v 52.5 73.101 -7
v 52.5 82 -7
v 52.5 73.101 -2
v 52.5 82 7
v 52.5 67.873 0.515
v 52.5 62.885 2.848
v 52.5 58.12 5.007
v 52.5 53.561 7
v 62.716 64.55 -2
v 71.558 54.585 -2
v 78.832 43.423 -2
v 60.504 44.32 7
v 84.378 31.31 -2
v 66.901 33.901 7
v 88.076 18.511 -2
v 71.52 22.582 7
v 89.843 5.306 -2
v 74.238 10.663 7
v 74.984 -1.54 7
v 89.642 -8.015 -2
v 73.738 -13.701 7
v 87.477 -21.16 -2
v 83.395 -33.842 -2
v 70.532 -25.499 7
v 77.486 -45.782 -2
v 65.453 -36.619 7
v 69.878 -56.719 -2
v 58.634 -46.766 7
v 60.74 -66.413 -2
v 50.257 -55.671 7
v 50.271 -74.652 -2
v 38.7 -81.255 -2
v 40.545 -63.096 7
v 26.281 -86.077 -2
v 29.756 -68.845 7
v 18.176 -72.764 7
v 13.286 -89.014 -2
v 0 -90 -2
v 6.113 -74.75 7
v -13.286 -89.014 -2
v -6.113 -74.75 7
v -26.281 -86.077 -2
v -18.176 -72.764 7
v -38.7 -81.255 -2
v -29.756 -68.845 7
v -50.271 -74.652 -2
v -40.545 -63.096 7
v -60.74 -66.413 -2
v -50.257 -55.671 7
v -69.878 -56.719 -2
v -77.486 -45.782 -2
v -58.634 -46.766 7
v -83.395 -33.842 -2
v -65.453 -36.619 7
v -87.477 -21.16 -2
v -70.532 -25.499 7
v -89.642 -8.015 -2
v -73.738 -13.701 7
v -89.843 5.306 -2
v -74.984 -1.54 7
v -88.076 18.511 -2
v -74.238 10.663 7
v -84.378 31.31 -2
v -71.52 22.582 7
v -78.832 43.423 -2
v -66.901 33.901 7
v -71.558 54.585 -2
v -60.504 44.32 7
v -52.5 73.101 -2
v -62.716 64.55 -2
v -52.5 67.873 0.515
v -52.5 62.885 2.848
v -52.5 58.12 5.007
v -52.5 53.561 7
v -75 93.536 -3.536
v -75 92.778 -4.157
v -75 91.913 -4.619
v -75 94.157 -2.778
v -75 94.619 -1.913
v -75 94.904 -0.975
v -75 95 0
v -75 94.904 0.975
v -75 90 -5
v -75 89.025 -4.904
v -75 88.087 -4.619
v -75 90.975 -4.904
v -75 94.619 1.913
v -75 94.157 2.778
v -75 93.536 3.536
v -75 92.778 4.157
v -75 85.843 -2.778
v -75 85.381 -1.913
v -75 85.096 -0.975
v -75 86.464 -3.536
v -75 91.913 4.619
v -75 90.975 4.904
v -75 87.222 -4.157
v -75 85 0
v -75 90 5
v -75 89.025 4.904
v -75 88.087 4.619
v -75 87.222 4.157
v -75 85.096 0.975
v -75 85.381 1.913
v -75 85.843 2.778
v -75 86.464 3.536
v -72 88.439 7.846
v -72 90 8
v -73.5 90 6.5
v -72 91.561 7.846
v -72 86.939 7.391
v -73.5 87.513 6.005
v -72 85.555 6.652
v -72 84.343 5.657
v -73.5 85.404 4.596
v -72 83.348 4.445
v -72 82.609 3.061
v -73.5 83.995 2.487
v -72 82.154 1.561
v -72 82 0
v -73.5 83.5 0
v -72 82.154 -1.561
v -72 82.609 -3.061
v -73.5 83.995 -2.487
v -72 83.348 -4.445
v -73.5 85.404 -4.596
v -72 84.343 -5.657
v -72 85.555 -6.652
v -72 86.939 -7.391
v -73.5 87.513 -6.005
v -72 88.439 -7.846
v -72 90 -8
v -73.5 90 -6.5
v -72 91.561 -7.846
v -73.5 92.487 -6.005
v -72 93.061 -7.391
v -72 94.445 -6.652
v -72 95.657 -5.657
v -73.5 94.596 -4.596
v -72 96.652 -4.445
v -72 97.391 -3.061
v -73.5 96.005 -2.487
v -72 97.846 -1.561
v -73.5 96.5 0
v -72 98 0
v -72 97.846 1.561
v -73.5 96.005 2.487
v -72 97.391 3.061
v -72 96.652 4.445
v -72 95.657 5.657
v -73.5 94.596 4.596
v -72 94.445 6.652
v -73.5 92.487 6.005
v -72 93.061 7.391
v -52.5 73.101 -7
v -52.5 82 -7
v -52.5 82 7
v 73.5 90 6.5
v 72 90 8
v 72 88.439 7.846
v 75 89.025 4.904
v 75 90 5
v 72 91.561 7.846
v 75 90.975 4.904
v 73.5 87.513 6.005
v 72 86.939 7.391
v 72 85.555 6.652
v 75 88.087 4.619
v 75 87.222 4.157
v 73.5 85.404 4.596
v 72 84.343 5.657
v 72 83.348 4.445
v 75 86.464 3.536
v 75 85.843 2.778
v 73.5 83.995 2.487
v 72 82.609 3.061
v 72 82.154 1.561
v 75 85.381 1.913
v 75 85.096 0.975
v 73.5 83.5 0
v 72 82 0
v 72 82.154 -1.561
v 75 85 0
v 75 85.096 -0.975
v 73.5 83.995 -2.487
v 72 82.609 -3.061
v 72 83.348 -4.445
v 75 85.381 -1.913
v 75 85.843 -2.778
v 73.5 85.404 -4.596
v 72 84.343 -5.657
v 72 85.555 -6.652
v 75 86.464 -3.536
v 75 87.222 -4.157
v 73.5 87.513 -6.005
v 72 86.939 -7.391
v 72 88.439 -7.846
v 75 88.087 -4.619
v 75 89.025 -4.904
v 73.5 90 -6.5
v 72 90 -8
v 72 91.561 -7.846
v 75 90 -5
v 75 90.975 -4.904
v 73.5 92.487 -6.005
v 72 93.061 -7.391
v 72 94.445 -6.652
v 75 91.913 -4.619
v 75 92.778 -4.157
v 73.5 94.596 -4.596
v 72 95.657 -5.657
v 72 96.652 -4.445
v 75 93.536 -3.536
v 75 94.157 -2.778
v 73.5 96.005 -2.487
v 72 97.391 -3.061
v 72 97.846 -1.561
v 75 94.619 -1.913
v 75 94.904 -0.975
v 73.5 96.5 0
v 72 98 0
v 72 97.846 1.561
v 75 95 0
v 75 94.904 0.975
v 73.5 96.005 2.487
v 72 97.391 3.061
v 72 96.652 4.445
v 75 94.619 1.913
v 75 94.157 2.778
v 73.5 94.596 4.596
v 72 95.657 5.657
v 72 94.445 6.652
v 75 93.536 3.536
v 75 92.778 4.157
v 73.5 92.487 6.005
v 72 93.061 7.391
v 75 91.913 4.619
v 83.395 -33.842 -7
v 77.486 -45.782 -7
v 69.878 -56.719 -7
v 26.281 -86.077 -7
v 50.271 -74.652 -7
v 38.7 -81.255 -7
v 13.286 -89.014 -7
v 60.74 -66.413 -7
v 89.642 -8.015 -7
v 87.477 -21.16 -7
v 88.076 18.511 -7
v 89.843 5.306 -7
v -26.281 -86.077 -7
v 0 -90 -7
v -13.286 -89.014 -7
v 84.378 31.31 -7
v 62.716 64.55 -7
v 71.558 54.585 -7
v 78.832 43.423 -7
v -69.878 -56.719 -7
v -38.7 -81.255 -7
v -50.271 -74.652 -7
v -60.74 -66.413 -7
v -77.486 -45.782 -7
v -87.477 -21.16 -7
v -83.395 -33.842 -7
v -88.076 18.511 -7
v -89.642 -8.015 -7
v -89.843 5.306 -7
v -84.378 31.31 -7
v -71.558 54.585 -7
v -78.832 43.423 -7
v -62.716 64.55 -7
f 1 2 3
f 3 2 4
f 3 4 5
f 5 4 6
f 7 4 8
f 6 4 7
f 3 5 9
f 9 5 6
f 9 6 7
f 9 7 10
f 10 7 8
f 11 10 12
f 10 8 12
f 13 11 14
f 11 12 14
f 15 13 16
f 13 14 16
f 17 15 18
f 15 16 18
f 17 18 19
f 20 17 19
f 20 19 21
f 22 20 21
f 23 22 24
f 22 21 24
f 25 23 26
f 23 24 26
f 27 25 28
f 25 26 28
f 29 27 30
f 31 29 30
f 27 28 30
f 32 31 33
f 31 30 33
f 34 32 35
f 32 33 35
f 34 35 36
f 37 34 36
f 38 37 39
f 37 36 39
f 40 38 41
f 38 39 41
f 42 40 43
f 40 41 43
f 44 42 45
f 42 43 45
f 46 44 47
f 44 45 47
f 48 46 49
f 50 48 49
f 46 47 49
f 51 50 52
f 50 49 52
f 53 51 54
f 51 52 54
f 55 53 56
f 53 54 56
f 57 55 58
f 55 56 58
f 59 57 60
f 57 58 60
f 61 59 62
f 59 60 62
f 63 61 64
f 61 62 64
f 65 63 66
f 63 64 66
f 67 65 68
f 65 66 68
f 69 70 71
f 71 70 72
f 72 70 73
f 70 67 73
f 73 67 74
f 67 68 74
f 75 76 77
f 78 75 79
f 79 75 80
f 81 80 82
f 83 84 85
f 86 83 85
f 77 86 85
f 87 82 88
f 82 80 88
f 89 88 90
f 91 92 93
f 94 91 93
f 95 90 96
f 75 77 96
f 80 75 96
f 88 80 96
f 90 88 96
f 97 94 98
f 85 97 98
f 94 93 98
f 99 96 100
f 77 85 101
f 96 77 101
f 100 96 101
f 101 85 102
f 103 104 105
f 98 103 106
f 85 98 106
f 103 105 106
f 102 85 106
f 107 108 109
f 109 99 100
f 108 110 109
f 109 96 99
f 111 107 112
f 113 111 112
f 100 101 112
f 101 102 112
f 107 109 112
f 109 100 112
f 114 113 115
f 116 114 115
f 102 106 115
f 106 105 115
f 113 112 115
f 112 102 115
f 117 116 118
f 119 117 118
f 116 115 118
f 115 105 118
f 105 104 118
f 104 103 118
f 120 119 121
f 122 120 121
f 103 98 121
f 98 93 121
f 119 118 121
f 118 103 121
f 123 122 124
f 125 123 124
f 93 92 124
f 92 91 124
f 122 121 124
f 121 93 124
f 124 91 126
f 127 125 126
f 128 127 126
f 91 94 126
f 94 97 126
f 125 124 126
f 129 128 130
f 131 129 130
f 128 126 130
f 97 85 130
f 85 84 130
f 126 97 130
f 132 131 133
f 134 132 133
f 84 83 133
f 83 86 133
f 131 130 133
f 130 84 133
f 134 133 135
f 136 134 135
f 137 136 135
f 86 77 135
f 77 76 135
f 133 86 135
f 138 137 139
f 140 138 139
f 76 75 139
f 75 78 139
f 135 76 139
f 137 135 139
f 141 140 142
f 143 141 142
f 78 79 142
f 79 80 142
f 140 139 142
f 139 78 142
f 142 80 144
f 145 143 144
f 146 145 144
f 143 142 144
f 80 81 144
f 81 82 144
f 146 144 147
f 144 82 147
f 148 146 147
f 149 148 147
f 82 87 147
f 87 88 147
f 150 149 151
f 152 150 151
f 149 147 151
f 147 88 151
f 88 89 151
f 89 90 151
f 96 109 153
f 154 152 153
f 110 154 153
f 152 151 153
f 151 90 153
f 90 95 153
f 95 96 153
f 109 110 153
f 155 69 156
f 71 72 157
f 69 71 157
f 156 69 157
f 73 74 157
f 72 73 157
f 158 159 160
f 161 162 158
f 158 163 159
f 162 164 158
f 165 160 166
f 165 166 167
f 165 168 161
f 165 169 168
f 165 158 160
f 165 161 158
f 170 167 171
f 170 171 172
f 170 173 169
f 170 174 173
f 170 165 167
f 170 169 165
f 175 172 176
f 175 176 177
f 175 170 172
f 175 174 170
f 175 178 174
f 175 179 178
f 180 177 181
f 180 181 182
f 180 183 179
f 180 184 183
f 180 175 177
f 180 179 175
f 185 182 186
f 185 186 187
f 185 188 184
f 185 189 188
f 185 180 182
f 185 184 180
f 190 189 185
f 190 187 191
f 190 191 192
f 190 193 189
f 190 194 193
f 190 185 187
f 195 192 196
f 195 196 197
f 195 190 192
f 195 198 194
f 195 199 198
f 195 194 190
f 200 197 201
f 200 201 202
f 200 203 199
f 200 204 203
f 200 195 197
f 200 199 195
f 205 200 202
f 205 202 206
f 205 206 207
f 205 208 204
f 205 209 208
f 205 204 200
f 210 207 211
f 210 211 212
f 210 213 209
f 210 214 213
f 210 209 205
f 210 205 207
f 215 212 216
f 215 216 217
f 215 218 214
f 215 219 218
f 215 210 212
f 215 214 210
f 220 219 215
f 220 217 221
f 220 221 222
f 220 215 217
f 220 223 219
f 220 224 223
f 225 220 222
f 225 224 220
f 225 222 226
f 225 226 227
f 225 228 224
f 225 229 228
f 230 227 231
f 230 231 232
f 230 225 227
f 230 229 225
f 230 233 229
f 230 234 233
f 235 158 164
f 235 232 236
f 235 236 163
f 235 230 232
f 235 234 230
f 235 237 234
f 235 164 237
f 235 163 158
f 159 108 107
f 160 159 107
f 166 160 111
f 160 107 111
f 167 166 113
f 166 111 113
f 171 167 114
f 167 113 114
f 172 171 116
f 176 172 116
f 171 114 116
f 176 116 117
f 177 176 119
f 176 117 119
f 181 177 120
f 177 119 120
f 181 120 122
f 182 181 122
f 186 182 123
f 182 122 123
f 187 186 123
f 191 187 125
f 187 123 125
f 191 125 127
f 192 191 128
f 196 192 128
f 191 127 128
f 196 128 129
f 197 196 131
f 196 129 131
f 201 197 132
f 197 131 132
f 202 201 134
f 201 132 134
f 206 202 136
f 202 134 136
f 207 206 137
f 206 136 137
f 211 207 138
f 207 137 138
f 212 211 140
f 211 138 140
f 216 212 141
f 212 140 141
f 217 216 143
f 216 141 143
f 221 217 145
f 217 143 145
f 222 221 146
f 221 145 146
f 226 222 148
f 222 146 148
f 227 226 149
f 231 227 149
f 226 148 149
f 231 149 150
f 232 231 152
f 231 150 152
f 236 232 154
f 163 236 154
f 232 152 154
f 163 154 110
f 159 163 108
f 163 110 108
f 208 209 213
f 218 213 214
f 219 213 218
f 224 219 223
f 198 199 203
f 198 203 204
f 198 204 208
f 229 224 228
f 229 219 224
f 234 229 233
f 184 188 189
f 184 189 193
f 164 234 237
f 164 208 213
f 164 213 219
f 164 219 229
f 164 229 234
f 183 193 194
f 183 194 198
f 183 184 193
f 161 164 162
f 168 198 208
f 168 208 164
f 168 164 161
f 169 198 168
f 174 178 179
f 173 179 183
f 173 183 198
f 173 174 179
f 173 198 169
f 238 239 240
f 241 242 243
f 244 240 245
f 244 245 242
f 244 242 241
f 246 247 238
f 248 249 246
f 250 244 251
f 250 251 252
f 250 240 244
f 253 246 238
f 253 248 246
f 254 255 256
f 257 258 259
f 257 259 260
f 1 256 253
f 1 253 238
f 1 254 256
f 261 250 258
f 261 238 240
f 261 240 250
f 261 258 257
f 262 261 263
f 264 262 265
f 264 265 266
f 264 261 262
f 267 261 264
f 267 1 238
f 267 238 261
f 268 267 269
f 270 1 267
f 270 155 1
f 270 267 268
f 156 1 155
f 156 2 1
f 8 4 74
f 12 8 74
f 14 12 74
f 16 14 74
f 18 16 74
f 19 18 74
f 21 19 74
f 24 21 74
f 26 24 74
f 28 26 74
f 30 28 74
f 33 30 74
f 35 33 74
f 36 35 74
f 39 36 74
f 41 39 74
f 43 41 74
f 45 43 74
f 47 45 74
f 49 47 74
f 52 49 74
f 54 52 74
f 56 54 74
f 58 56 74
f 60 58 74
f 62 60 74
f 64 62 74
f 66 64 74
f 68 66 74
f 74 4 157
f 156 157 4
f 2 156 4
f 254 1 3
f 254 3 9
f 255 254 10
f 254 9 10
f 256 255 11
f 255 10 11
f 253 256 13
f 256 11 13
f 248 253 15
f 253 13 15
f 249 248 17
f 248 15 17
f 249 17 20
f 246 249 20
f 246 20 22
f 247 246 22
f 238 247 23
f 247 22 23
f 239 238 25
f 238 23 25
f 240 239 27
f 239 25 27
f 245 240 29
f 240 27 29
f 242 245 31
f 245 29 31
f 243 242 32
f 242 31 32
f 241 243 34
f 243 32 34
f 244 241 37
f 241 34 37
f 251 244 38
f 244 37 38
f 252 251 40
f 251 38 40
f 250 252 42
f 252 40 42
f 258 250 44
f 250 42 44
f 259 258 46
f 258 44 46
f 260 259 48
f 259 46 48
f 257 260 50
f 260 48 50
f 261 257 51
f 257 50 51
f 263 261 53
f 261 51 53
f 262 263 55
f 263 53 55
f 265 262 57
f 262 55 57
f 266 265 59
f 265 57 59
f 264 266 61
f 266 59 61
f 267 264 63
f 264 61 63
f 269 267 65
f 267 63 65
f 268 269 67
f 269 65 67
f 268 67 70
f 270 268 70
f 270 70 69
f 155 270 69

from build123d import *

# Parameters (mm, degrees)
BOSS_EXTRUDE1_DEPTH      = 7
BOSS_EXTRUDE2_DEPTH      = 75
BOSS_EXTRUDE2_DEPTH_BACK = 75
SKETCH6_R                = 8
CHAMFER1_SIZE            = 3
SKETCH11_W               = 105
SKETCH11_H               = 28.439286786
BOSS_EXTRUDE3_DEPTH      = 14


with BuildPart() as part:
    # Sketch1 → Boss-Extrude1 (new, symmetric)
    with BuildSketch(Plane.XY):
        with BuildLine():
            Line((-52.5, 73.100957586), (-52.5, 82))
            Line((-52.5, 82), (52.5, 82))
            Line((52.5, 82), (52.5, 73.100957586))
            ThreePointArc((52.5, 73.100957586), (0, -90), (-52.5, 73.100957586))
        make_face()
    extrude(amount=BOSS_EXTRUDE1_DEPTH, both=True)

    # Sketch7 → Cut-Revolve2 (revolve, cut)
    with BuildSketch(Plane(origin=(0, 0, 0), x_dir=(1, 0, 0), z_dir=(0, 1, 0)), mode=Mode.PRIVATE) as cut_revolve2_sk:
        Polygon((-90, -7), (-90, 2), (-75, -7), align=None)
    revolve(cut_revolve2_sk.sketch.rotate(Axis((0, 0, 0), (0, 0, -1)), 54.314665287), axis=Axis((0, 0, 0), (0, 0, -1)), mode=Mode.SUBTRACT)

    # Sketch11 → Boss-Extrude3 (add)
    with BuildSketch(Plane.XY.offset(7)):
        with Locations((0, 67.780356607)):
            Rectangle(SKETCH11_W, SKETCH11_H)
    extrude(amount=-BOSS_EXTRUDE3_DEPTH)


with BuildPart() as body_2:
    # Sketch6 → Boss-Extrude2 (new, two sides: drawn at the far end of the back side and taken through both)
    with BuildSketch(Plane(origin=(0, 0, 0), x_dir=(0, 0, -1), z_dir=(1, 0, 0)).offset(-BOSS_EXTRUDE2_DEPTH_BACK)):
        with Locations(Location((0, 90, 0), (0, 0, 180))):
            Circle(SKETCH6_R)
    extrude(amount=BOSS_EXTRUDE2_DEPTH + BOSS_EXTRUDE2_DEPTH_BACK)

    # Chamfer1
    chamfer1_edges = [body_2.edges().sort_by_distance(p)[0] for p in [
        (75, 90, -8),
        (-75, 90, -8),
    ]]
    chamfer(chamfer1_edges, length=CHAMFER1_SIZE)


solid = Compound([part.part, body_2.part])
